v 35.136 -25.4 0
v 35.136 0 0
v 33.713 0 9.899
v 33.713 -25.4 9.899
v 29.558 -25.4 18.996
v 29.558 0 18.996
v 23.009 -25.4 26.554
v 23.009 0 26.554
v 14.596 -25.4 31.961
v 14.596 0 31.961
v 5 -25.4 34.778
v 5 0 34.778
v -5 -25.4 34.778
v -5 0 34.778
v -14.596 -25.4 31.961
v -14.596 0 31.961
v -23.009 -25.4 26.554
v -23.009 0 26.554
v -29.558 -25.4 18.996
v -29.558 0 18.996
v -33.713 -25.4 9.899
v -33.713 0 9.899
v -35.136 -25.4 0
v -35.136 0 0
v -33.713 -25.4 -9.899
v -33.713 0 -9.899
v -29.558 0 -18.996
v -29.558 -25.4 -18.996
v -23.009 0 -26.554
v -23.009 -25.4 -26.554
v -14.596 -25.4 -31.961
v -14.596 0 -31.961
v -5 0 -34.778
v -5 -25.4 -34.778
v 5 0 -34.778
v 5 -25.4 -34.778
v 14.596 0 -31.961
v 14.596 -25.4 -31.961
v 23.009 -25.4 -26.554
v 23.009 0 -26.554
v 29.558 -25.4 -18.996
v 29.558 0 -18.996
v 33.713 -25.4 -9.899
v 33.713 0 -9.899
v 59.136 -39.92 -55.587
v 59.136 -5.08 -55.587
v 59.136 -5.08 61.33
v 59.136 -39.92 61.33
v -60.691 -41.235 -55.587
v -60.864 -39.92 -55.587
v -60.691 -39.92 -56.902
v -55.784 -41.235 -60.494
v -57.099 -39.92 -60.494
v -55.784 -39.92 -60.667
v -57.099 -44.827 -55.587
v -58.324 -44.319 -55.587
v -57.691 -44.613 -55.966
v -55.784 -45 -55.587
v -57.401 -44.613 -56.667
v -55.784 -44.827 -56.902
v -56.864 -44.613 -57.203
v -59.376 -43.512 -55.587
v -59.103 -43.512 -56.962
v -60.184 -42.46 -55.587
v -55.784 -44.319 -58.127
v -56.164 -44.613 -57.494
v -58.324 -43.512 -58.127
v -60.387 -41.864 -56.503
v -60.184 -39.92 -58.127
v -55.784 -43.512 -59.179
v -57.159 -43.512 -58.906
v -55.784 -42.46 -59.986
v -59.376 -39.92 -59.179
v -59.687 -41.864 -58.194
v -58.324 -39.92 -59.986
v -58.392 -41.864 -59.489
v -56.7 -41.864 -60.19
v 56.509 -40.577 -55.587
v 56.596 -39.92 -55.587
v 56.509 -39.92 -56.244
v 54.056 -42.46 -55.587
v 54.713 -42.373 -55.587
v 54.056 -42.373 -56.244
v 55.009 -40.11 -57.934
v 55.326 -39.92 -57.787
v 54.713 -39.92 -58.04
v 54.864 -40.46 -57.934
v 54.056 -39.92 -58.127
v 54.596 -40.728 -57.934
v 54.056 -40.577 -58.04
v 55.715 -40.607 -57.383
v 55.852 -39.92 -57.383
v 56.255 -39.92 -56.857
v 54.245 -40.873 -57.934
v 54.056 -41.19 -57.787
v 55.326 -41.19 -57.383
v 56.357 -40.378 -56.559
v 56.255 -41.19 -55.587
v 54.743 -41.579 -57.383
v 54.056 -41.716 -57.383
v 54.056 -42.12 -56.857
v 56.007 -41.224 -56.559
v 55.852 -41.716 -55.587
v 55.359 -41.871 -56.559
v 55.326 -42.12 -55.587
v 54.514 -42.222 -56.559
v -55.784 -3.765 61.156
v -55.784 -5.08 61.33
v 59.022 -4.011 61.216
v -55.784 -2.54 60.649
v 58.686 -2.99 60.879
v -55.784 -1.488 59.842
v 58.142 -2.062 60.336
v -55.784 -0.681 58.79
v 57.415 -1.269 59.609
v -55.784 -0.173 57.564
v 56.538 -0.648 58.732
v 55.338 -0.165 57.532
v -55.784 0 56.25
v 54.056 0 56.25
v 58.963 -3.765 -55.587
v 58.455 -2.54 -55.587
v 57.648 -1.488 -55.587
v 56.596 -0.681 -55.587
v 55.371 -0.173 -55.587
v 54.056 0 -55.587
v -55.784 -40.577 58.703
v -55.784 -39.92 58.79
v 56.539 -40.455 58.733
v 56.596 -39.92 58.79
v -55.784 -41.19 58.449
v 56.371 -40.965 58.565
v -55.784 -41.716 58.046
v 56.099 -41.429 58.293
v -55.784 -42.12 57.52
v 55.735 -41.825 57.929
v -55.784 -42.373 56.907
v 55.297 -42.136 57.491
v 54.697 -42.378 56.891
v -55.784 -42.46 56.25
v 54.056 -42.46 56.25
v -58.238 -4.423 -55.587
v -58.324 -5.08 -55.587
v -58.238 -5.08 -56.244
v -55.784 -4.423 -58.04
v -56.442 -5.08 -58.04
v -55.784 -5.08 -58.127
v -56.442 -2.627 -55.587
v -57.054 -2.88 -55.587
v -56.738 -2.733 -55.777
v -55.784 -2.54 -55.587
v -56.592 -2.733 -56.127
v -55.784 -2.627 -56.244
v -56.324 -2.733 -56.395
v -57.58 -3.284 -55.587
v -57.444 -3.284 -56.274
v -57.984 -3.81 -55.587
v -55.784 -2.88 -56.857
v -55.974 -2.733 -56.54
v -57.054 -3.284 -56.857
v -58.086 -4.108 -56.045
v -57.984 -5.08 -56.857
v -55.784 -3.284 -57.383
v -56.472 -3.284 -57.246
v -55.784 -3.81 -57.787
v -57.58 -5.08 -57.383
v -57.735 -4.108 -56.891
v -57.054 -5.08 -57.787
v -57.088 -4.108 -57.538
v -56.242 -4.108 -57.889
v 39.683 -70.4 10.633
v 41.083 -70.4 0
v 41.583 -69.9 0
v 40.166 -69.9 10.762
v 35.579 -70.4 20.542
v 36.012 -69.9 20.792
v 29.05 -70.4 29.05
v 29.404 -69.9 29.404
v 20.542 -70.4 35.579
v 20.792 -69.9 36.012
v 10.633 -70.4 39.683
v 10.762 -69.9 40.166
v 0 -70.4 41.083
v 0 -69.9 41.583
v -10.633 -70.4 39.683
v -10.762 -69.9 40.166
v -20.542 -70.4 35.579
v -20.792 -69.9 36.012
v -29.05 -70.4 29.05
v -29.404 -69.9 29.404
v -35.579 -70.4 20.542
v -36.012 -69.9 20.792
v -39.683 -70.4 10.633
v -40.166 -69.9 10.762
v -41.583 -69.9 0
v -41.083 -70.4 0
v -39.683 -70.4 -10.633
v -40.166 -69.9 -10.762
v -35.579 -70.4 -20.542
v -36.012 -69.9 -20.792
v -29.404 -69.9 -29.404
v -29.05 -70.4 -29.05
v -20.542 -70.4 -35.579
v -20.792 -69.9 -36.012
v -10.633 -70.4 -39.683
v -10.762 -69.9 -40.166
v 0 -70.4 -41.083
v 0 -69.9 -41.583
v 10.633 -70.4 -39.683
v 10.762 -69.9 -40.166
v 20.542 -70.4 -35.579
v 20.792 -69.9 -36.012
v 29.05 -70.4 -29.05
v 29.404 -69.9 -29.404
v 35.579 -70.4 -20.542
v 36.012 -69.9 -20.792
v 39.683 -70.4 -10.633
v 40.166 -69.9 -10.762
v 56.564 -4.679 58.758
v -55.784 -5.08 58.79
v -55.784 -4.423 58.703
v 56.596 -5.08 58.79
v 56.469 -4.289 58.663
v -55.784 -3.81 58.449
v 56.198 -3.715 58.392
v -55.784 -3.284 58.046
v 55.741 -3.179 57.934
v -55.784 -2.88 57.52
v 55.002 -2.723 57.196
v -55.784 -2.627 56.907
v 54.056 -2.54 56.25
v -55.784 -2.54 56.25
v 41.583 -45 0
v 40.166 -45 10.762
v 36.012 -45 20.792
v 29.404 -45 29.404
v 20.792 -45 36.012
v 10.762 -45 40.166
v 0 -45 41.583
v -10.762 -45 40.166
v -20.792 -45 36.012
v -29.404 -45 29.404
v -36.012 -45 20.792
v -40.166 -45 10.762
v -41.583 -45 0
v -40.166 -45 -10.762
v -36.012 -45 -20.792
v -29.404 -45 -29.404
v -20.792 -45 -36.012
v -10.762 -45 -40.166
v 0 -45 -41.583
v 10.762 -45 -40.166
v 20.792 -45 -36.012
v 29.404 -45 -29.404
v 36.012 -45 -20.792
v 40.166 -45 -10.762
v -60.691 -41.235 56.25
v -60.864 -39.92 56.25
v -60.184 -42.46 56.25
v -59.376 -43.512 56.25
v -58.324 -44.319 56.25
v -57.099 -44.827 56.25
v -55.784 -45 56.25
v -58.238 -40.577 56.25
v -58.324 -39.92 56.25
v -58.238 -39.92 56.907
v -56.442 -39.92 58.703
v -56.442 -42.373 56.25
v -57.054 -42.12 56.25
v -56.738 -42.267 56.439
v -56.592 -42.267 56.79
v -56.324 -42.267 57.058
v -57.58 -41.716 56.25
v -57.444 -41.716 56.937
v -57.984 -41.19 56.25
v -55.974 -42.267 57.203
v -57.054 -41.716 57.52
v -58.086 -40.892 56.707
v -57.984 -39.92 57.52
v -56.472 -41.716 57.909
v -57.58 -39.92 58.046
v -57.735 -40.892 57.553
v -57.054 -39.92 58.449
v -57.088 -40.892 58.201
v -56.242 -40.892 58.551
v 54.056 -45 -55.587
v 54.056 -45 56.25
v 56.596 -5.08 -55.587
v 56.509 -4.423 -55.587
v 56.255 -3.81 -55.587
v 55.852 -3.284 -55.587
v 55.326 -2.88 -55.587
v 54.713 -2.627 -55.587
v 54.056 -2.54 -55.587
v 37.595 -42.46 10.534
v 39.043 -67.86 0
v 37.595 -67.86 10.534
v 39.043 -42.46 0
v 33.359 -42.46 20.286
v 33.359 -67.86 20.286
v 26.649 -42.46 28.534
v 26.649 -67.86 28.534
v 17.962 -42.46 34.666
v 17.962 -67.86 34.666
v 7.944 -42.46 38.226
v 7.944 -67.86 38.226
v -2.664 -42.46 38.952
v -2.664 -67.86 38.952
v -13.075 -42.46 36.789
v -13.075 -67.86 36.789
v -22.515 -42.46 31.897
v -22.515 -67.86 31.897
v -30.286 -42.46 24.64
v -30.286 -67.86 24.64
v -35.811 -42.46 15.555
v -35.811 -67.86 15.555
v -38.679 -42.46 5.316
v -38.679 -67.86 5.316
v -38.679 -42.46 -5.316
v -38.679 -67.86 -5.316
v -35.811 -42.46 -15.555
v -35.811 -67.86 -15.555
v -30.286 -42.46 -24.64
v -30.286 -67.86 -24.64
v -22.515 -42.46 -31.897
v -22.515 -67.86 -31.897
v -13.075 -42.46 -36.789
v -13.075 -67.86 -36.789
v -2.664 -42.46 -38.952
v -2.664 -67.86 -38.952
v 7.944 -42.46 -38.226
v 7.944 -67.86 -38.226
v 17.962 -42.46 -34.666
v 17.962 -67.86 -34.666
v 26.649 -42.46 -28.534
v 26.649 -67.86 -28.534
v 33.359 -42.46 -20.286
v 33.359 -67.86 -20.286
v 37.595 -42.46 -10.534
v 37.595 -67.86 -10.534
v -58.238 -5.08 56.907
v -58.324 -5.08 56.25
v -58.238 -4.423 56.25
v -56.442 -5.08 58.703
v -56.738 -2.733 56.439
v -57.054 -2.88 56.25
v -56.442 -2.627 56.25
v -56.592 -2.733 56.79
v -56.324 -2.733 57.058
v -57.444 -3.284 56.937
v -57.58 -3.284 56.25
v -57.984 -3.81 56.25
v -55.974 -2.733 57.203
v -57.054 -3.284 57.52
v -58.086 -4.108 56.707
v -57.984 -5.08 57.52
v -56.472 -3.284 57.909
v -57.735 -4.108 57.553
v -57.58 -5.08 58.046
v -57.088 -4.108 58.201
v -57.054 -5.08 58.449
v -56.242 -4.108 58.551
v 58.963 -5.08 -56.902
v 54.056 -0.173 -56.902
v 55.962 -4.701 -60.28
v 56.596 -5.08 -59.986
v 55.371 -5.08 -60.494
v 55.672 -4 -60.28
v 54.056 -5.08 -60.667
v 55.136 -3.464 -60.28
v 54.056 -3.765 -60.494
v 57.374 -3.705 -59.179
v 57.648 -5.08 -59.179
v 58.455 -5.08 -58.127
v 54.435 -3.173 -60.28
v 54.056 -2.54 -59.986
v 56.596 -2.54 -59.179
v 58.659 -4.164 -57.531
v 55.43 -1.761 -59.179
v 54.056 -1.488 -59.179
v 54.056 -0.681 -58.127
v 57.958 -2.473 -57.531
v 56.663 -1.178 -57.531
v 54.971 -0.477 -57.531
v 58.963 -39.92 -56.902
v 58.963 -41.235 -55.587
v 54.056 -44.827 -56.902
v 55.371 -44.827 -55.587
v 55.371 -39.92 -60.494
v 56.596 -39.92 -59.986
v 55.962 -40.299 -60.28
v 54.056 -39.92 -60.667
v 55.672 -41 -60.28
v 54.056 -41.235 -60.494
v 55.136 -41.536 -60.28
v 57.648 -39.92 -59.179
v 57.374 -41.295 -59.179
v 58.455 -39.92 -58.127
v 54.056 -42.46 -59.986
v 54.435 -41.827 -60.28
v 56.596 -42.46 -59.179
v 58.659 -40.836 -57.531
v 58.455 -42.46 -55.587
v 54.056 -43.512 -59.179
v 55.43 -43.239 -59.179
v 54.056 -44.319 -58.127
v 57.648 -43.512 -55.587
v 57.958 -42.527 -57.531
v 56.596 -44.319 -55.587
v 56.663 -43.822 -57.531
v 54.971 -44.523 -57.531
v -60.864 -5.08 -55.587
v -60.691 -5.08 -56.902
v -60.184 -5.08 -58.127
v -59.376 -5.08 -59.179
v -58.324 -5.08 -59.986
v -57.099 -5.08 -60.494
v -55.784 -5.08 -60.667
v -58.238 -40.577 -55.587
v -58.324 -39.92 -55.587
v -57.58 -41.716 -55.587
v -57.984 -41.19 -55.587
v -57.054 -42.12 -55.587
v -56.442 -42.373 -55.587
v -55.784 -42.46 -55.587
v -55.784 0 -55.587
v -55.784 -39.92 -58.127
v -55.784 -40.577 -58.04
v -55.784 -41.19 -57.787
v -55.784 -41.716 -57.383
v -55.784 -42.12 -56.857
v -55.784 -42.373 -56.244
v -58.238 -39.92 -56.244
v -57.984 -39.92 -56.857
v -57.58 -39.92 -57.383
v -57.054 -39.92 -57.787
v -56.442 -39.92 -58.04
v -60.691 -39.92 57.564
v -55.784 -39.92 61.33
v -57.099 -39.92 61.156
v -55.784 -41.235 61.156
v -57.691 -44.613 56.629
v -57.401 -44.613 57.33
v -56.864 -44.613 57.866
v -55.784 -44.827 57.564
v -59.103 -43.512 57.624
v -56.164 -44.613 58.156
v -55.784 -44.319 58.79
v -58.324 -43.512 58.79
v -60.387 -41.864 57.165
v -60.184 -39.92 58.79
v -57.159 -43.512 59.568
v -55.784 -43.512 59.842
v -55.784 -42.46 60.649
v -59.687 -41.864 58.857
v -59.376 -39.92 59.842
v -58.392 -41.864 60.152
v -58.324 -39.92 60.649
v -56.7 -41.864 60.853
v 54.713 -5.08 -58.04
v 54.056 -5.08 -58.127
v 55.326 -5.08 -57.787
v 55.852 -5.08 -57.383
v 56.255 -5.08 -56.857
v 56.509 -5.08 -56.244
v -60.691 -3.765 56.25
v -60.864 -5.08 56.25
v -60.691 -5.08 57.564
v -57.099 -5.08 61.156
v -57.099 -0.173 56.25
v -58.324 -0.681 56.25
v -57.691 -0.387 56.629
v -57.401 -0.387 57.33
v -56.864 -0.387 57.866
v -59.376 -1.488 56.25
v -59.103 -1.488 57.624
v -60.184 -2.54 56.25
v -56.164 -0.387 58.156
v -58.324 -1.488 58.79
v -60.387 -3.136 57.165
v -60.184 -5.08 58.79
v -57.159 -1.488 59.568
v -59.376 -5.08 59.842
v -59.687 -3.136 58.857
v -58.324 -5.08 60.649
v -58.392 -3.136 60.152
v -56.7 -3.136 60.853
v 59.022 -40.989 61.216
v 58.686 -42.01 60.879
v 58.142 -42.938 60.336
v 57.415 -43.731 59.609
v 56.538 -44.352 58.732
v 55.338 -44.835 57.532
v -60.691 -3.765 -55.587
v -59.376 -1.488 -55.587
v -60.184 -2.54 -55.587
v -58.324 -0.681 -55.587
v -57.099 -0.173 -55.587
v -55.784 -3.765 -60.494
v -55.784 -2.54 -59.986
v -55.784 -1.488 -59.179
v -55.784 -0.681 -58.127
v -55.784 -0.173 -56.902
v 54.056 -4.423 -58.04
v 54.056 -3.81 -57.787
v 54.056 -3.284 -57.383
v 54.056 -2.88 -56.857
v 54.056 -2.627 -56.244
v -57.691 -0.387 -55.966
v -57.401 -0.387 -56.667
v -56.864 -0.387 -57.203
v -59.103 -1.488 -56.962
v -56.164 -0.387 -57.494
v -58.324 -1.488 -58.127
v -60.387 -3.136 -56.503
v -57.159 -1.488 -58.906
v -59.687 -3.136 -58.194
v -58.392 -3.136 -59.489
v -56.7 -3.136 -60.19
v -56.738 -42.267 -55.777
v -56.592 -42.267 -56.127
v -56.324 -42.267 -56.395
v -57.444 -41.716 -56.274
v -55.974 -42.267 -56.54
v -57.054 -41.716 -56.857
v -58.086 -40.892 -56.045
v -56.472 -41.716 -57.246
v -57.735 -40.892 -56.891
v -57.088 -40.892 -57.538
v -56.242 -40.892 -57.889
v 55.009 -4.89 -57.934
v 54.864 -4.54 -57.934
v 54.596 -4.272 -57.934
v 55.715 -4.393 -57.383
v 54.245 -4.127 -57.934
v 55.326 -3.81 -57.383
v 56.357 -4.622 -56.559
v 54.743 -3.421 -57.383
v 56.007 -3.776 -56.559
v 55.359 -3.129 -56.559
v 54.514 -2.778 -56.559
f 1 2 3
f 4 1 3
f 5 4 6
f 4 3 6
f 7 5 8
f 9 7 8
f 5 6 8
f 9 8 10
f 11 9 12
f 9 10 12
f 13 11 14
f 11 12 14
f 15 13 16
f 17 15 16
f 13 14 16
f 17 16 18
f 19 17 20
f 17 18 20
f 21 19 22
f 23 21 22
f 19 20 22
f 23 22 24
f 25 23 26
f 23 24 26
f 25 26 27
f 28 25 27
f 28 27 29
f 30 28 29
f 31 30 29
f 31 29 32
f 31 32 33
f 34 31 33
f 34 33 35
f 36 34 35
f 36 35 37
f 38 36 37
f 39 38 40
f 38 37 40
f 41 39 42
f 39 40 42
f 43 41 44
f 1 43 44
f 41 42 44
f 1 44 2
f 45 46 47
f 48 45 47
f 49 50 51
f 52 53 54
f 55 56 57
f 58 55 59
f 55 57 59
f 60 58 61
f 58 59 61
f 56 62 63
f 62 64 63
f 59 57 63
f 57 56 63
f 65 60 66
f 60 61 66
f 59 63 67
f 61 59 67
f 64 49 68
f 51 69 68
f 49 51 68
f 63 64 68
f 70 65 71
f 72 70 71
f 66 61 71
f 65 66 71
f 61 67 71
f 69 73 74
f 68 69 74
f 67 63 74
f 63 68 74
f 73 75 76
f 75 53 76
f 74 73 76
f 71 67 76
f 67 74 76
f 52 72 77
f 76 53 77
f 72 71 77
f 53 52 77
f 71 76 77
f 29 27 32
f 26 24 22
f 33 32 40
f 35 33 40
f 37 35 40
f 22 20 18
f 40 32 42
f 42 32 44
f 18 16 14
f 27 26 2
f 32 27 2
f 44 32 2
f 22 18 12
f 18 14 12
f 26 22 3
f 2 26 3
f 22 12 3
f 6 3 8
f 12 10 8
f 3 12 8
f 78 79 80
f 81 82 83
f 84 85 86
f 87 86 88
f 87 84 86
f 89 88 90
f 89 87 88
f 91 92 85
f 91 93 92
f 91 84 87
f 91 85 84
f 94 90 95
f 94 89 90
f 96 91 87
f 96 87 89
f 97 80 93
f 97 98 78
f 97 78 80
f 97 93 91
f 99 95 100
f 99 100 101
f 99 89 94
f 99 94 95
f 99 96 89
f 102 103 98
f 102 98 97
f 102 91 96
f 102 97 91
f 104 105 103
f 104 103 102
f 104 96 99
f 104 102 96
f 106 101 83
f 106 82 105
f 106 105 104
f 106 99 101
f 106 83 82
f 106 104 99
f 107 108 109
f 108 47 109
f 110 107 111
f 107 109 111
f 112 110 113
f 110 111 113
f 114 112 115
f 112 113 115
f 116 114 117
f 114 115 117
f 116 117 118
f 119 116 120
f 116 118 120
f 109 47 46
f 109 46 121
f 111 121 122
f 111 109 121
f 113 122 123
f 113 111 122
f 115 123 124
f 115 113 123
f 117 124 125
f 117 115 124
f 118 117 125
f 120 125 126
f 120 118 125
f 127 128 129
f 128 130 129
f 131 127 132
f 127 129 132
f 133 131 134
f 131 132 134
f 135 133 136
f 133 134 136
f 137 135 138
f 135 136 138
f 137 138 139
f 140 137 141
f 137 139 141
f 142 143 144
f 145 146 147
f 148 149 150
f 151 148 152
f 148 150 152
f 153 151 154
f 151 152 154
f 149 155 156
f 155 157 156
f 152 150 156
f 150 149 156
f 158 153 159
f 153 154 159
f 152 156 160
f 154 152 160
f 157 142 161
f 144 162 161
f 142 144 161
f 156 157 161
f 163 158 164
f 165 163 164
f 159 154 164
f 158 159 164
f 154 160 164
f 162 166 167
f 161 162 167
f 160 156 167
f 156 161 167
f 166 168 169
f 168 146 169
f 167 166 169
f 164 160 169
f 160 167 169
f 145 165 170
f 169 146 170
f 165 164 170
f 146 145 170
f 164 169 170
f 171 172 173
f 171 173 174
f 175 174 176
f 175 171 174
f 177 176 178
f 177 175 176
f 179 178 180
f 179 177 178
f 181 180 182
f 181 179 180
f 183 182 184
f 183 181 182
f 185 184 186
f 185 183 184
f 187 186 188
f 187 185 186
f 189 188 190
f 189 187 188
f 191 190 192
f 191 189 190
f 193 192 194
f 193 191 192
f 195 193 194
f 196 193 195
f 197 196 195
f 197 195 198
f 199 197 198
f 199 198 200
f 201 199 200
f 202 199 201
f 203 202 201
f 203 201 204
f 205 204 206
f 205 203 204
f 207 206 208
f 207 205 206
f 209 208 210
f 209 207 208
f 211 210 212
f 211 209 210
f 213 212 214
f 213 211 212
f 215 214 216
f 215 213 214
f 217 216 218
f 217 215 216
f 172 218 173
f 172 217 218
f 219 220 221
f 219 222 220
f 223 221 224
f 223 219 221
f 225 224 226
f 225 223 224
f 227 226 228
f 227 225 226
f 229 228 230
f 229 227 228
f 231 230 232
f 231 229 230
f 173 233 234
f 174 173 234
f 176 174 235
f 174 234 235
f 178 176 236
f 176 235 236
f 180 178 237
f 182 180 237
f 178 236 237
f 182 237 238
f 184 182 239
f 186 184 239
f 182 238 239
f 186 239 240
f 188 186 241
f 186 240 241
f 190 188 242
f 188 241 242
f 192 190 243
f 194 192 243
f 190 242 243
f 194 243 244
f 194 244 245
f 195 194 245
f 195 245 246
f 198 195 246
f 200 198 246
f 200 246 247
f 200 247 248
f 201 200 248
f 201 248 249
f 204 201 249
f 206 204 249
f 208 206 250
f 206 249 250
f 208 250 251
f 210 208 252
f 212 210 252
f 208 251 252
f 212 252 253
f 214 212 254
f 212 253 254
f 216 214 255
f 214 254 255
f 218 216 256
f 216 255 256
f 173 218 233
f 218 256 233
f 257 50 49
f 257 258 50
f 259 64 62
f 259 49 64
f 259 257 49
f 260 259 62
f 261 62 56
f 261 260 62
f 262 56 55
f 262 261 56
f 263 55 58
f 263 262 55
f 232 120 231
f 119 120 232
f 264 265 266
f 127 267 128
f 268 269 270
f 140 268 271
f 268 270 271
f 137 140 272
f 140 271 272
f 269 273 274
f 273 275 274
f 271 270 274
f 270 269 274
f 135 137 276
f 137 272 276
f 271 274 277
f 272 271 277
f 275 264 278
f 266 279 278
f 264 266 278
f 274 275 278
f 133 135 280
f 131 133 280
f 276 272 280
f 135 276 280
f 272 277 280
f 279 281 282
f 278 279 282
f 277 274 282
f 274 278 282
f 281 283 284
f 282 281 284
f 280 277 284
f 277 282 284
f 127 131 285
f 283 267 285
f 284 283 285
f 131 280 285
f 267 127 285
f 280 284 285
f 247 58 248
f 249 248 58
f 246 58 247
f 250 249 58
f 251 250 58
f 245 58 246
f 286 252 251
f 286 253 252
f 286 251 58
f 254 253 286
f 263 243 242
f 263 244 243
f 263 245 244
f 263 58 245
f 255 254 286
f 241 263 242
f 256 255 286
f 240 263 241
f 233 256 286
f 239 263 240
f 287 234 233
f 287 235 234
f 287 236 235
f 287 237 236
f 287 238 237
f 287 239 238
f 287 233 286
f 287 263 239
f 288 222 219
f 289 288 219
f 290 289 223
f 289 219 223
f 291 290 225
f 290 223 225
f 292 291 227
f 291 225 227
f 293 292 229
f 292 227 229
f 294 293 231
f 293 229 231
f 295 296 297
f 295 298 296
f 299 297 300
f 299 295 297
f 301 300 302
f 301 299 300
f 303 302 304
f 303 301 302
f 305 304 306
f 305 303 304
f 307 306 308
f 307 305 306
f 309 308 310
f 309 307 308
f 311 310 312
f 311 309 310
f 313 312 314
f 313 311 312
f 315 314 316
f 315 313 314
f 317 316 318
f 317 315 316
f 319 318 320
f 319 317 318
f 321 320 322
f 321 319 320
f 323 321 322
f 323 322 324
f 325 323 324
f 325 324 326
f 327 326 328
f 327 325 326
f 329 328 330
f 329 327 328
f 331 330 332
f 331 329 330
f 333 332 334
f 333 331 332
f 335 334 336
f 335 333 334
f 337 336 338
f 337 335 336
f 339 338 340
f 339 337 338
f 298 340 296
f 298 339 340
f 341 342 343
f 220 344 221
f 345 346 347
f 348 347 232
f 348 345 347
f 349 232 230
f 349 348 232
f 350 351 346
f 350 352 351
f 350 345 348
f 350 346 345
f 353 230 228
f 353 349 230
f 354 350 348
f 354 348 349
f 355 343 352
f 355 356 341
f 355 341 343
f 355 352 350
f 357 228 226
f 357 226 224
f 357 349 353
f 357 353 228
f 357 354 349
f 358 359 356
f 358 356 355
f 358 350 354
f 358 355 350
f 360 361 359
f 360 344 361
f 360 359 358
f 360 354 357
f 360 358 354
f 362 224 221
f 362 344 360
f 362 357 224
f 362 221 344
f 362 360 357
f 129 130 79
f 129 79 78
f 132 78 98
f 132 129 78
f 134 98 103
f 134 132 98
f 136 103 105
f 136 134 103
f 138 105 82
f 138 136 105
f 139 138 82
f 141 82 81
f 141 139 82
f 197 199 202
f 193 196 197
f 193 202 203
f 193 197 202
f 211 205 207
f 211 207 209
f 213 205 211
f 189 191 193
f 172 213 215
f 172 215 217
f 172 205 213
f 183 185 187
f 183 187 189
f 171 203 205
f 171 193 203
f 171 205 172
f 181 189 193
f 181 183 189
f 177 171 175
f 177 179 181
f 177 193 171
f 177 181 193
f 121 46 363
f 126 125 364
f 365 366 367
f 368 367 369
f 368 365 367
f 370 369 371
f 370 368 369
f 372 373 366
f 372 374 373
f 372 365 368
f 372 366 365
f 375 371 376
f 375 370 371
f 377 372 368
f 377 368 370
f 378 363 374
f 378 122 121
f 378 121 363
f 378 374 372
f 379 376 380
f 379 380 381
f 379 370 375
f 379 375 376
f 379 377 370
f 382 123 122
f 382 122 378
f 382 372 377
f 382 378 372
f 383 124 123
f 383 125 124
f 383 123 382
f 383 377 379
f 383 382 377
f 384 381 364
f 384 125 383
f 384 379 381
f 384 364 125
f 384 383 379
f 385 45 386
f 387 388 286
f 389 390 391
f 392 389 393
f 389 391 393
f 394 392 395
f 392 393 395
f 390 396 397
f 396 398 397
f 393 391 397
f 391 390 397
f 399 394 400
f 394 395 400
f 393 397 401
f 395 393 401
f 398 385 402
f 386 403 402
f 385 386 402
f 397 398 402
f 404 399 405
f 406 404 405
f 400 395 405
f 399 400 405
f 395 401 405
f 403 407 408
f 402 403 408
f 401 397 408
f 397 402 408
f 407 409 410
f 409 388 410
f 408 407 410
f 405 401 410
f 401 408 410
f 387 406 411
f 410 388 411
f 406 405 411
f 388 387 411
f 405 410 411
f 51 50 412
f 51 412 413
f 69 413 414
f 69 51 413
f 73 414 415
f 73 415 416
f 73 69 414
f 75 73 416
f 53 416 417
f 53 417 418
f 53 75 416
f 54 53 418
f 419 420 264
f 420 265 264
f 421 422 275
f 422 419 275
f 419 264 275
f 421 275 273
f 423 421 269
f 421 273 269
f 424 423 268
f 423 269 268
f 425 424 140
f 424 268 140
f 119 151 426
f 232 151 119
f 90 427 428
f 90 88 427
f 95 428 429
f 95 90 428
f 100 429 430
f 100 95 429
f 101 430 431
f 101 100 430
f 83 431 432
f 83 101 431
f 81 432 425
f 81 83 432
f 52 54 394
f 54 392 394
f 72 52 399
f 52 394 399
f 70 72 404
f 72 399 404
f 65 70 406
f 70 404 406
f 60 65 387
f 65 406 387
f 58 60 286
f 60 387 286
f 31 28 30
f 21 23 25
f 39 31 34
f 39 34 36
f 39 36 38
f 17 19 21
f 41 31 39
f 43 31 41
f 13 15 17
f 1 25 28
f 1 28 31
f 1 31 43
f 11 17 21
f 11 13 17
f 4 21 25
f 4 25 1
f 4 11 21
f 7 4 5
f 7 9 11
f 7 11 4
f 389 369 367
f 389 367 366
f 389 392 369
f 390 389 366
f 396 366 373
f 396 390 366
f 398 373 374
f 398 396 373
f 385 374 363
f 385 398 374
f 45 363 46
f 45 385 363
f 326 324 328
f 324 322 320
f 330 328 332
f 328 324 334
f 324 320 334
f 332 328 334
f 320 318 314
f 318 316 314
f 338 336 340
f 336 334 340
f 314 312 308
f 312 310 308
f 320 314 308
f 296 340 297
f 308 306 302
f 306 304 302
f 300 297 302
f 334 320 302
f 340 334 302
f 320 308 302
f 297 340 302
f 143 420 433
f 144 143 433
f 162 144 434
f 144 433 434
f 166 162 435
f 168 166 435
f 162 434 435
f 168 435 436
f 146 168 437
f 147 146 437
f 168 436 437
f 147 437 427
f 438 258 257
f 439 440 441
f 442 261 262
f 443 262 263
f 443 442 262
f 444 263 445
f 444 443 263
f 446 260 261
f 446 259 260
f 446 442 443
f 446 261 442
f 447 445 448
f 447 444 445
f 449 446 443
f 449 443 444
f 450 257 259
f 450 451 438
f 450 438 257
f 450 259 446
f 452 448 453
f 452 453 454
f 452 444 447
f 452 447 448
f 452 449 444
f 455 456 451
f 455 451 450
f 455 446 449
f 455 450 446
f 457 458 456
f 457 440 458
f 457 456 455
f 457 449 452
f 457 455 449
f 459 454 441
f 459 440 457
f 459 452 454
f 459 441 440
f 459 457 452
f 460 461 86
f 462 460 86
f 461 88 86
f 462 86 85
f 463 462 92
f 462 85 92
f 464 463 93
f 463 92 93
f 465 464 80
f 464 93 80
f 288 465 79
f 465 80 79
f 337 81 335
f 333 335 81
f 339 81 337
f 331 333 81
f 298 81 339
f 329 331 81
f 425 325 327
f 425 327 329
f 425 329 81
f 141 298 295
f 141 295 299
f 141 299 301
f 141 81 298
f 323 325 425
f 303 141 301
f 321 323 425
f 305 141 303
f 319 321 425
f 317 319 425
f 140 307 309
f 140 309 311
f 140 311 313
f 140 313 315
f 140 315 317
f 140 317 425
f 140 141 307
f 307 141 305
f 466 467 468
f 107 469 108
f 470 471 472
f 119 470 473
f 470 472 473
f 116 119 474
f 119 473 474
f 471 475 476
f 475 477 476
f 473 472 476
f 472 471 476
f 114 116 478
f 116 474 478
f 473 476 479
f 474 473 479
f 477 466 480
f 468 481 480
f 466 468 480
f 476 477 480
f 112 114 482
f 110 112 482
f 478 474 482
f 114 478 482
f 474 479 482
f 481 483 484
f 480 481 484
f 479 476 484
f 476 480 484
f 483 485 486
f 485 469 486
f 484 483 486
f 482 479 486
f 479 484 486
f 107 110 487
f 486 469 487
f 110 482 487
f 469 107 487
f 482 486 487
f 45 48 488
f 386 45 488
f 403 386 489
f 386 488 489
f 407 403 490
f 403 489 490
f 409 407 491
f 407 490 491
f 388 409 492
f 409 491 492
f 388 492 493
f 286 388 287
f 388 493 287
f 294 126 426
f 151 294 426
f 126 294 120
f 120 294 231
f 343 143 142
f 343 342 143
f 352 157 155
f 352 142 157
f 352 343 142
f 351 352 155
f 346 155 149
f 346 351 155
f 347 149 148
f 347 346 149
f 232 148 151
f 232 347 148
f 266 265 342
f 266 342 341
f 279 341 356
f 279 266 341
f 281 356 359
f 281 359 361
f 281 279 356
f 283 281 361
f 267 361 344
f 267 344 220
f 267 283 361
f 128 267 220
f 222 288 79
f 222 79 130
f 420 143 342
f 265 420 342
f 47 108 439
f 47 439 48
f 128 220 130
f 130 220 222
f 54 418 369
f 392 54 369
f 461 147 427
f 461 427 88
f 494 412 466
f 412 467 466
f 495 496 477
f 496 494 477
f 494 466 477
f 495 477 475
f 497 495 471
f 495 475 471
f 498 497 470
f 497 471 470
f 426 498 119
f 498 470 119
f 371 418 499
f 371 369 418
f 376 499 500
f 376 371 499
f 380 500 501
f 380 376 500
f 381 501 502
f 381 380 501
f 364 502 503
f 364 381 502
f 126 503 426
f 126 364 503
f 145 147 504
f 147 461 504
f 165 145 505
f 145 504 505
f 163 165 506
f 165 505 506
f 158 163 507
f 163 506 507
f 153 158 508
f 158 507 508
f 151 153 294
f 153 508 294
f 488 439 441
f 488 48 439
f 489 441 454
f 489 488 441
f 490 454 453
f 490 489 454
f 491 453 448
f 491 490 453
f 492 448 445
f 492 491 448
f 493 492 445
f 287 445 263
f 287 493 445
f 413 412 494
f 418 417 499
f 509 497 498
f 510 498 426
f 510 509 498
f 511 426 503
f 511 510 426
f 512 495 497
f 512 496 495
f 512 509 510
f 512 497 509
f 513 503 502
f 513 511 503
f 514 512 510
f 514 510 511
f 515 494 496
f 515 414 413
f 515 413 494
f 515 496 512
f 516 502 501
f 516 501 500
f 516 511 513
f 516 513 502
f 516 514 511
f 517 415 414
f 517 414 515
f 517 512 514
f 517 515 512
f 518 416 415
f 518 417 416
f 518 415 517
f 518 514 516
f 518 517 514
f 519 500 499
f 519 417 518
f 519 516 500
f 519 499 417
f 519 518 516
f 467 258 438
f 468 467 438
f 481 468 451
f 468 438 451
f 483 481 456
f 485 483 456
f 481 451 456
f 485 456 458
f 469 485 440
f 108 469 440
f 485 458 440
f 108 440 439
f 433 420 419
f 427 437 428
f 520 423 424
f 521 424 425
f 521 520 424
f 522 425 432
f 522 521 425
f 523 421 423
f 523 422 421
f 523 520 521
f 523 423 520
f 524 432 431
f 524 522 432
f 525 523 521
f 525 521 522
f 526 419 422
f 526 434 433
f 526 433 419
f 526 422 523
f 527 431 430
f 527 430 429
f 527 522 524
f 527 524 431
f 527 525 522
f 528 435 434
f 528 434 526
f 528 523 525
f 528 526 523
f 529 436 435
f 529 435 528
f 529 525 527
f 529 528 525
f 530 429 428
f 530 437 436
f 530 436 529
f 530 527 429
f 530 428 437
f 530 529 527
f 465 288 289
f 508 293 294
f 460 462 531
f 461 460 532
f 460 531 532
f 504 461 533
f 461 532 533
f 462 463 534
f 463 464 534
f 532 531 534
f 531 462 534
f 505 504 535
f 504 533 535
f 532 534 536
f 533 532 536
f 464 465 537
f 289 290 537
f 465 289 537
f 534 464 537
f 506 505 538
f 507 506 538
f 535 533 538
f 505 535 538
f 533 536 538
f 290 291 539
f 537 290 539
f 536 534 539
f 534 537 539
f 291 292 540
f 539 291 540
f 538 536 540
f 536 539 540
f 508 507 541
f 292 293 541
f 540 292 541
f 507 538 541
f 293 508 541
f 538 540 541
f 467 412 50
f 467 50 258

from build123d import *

# Parameters (mm, degrees)
F0_W      = 120
F0_H      = 121.996589005
F1_DEPTH  = 45
F3_R      = 35.3699694231
F2_R      = 41.5830123254
F4_DEPTH  = 50.8
F5_R      = 5.08
F6_DEPTH  = 25.4
F7_DEPTH  = 25.4
F9_DEPTH  = 25.4
F10_SIZE  = 0.5
F11_T     = 2.54
F12_R     = 35.1358269191
F13_DEPTH = 25.4


# Not quite as in the source:
# - a shell that OpenCascade refuses in one call is made with other operations: the cavity is built on its own and cut out
# - the program builds the solid bodies; features that only make, move or delete a surface that nothing else refers to are left out


with BuildPart() as f1:
    # F0 (on Front) → F1 (new body)
    with BuildSketch(Plane.XZ):
        with Locations((-0.8642734587, 0.3312714398)):
            Rectangle(F0_W, F0_H)
    extrude(amount=F1_DEPTH)

    # F3 (on face) + F2 (on face) → F4 (cut)
    with BuildSketch(Plane.XZ.offset(45)):
        Circle(F3_R)
    with BuildSketch(Plane.XZ.offset(45)):
        Circle(F2_R)
    extrude(amount=F4_DEPTH, mode=Mode.SUBTRACT)

    # F5
    f5_edges = [f1.edges().sort_by_distance(p)[0] for p in [
        (-60.864273, -22.5, 61.329566),
        (-60.864273, -22.5, -60.667023),
        (-60.864273, 0, 0.331271),
        (-60.864273, -45, 0.331271),
        (-0.864273, -45, 61.329566),
        (-0.864273, 0, 61.329566),
        (59.135727, 0, 0.331271),
        (59.135727, -45, 0.331271),
        (59.135727, -22.5, -60.667023),
        (-0.864273, -45, -60.667023),
        (-0.864273, 0, -60.667023),
    ]]
    fillet(f5_edges, radius=F5_R)

    # F3 (on face) + F2 (on face) → F6 (join)
    with BuildSketch(Plane.XZ.offset(45)):
        Circle(F3_R)
    with BuildSketch(Plane.XZ.offset(45)):
        Circle(F2_R)
    extrude(amount=F6_DEPTH)

    # F3 (on face) → F7 (join)
    with BuildSketch(Plane.XZ.offset(45)):
        Circle(F3_R)
    extrude(amount=-F7_DEPTH)

    # F3 (on face) → F9 (join)
    with BuildSketch(Plane.XZ.offset(45)):
        Circle(F3_R)
    extrude(amount=-F9_DEPTH)

    # F10
    f10_edges = [f1.edges().sort_by_distance(p)[0] for p in [
        (-41.583012, -70.4, 0),
    ]]
    chamfer(f10_edges, length=F10_SIZE)

    # F11: shell of thickness 2.54, made by hand


with BuildPart() as f11_core1:
    # F11_t2: copy of F1
    add(f1.part)

    # the walls: a layer under each face that stays
    f11_faces = [f11_core1.faces().sort_by_distance(p)[0] for p in [
        (-41.5830123254, -57.45, 0),
        (-41.3330123254, -70.15, 0),
        (-37.4776067921, -45, -36.9475915619),
        (0, -70.4, 0),
        (-59.3763759071, -43.5121024484, 0.3312714398),
        (1.6757265413, -43.5121025775, 59.8416682617),
        (-0.8642734587, -43.5121024484, -59.1791255111),
        (57.6478288607, -43.5121025775, 2.8712714398),
        (-58.3242734587, -43.5121024484, 58.7895659423),
        (-60.8642734587, -22.5, 0.3312714398),
        (-58.3242734587, -43.5121024484, -58.1270230627),
        (1.6757265413, -22.5, 61.3295659423),
        (-0.8642734587, -22.5, -60.6670230627),
        (56.5957265413, -42.46, -59.1791255111),
        (59.1357265413, -22.5, 2.8712714398),
        (-59.3763759071, -22.5, 59.8416683907),
        (-59.3763759071, -1.4878975516, 0.3312714398),
        (-59.3763759071, -22.5, -59.1791255111),
        (1.6757265413, -1.4878975516, 59.8416683907),
        (-0.8642734587, -1.4878975516, -59.1791255111),
        (57.6478289897, -22.5, -59.1791255111),
        (57.6478289897, -1.4878975516, 2.8712714398),
        (-58.3242734587, -1.4878975516, 58.7895659423),
        (-58.3242734587, -1.4878975516, -58.1270230627),
        (56.5957265413, -2.54, -59.1791255111),
    ]]
    thicken(f11_faces, amount=-F11_T, mode=Mode.SUBTRACT)

    # F11_s3 → F11_t4 (revolve, cut)
    with BuildSketch(Plane.XY):
        Polygon((41.6084123254, -45.0254), (39.0430123254, -45), (39.0430123254, -42.46), (41.5830123254, -42.46), align=None)
    revolve(axis=Axis((0, -45, 0), (0, -1, 0)), mode=Mode.SUBTRACT)


with BuildPart() as f1_1:
    add(f1.part)

    # what is left inside the walls is the cavity
    f11_cavity = [f11_core1.part.solids().sort_by_distance(p)[0] for p in [
        (-0.864273, -0.0254, -18.30816),
    ]]
    add(f11_cavity, mode=Mode.SUBTRACT)


with BuildPart() as f13:
    # F12 (on Front) → F13 (new body)
    with BuildSketch(Plane.XZ):
        Circle(F12_R)
    extrude(amount=F13_DEPTH)


solid = Compound([f1_1.part, f13.part])
